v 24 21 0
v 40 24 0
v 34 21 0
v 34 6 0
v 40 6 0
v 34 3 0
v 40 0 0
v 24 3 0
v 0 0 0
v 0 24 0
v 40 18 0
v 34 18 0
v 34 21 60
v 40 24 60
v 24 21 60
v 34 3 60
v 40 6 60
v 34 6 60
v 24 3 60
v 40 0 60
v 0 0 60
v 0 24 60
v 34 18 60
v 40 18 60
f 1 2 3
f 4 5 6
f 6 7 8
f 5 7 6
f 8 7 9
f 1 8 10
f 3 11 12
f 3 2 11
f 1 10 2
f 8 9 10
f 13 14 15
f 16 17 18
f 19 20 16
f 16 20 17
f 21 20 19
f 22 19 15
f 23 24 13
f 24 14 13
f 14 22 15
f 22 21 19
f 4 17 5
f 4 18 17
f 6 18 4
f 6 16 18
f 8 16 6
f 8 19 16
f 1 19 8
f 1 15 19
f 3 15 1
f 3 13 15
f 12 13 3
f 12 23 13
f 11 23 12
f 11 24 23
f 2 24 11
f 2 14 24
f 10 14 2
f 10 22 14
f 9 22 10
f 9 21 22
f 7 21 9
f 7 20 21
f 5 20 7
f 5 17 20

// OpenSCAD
$fn = 32;

// ----------------------------------------------------------------------
// T-slot rail: 40 x 24 mm section, 60 mm long
// ----------------------------------------------------------------------

// --- parameters (mm) ---
profile_height = 60;      // extrusion height
profile_points = 12;      // points of the closed outline

profile = [[0, 0], [40, 0], [40, 6], [34, 6], [34, 3], [24, 3], [24, 21], [34, 21], [34, 18], [40, 18], [40, 24], [0, 24]];  // single closed polygon, 12 points, counter clockwise

// --- the one profile operation ---
linear_extrude(height = profile_height) polygon(points = profile);
